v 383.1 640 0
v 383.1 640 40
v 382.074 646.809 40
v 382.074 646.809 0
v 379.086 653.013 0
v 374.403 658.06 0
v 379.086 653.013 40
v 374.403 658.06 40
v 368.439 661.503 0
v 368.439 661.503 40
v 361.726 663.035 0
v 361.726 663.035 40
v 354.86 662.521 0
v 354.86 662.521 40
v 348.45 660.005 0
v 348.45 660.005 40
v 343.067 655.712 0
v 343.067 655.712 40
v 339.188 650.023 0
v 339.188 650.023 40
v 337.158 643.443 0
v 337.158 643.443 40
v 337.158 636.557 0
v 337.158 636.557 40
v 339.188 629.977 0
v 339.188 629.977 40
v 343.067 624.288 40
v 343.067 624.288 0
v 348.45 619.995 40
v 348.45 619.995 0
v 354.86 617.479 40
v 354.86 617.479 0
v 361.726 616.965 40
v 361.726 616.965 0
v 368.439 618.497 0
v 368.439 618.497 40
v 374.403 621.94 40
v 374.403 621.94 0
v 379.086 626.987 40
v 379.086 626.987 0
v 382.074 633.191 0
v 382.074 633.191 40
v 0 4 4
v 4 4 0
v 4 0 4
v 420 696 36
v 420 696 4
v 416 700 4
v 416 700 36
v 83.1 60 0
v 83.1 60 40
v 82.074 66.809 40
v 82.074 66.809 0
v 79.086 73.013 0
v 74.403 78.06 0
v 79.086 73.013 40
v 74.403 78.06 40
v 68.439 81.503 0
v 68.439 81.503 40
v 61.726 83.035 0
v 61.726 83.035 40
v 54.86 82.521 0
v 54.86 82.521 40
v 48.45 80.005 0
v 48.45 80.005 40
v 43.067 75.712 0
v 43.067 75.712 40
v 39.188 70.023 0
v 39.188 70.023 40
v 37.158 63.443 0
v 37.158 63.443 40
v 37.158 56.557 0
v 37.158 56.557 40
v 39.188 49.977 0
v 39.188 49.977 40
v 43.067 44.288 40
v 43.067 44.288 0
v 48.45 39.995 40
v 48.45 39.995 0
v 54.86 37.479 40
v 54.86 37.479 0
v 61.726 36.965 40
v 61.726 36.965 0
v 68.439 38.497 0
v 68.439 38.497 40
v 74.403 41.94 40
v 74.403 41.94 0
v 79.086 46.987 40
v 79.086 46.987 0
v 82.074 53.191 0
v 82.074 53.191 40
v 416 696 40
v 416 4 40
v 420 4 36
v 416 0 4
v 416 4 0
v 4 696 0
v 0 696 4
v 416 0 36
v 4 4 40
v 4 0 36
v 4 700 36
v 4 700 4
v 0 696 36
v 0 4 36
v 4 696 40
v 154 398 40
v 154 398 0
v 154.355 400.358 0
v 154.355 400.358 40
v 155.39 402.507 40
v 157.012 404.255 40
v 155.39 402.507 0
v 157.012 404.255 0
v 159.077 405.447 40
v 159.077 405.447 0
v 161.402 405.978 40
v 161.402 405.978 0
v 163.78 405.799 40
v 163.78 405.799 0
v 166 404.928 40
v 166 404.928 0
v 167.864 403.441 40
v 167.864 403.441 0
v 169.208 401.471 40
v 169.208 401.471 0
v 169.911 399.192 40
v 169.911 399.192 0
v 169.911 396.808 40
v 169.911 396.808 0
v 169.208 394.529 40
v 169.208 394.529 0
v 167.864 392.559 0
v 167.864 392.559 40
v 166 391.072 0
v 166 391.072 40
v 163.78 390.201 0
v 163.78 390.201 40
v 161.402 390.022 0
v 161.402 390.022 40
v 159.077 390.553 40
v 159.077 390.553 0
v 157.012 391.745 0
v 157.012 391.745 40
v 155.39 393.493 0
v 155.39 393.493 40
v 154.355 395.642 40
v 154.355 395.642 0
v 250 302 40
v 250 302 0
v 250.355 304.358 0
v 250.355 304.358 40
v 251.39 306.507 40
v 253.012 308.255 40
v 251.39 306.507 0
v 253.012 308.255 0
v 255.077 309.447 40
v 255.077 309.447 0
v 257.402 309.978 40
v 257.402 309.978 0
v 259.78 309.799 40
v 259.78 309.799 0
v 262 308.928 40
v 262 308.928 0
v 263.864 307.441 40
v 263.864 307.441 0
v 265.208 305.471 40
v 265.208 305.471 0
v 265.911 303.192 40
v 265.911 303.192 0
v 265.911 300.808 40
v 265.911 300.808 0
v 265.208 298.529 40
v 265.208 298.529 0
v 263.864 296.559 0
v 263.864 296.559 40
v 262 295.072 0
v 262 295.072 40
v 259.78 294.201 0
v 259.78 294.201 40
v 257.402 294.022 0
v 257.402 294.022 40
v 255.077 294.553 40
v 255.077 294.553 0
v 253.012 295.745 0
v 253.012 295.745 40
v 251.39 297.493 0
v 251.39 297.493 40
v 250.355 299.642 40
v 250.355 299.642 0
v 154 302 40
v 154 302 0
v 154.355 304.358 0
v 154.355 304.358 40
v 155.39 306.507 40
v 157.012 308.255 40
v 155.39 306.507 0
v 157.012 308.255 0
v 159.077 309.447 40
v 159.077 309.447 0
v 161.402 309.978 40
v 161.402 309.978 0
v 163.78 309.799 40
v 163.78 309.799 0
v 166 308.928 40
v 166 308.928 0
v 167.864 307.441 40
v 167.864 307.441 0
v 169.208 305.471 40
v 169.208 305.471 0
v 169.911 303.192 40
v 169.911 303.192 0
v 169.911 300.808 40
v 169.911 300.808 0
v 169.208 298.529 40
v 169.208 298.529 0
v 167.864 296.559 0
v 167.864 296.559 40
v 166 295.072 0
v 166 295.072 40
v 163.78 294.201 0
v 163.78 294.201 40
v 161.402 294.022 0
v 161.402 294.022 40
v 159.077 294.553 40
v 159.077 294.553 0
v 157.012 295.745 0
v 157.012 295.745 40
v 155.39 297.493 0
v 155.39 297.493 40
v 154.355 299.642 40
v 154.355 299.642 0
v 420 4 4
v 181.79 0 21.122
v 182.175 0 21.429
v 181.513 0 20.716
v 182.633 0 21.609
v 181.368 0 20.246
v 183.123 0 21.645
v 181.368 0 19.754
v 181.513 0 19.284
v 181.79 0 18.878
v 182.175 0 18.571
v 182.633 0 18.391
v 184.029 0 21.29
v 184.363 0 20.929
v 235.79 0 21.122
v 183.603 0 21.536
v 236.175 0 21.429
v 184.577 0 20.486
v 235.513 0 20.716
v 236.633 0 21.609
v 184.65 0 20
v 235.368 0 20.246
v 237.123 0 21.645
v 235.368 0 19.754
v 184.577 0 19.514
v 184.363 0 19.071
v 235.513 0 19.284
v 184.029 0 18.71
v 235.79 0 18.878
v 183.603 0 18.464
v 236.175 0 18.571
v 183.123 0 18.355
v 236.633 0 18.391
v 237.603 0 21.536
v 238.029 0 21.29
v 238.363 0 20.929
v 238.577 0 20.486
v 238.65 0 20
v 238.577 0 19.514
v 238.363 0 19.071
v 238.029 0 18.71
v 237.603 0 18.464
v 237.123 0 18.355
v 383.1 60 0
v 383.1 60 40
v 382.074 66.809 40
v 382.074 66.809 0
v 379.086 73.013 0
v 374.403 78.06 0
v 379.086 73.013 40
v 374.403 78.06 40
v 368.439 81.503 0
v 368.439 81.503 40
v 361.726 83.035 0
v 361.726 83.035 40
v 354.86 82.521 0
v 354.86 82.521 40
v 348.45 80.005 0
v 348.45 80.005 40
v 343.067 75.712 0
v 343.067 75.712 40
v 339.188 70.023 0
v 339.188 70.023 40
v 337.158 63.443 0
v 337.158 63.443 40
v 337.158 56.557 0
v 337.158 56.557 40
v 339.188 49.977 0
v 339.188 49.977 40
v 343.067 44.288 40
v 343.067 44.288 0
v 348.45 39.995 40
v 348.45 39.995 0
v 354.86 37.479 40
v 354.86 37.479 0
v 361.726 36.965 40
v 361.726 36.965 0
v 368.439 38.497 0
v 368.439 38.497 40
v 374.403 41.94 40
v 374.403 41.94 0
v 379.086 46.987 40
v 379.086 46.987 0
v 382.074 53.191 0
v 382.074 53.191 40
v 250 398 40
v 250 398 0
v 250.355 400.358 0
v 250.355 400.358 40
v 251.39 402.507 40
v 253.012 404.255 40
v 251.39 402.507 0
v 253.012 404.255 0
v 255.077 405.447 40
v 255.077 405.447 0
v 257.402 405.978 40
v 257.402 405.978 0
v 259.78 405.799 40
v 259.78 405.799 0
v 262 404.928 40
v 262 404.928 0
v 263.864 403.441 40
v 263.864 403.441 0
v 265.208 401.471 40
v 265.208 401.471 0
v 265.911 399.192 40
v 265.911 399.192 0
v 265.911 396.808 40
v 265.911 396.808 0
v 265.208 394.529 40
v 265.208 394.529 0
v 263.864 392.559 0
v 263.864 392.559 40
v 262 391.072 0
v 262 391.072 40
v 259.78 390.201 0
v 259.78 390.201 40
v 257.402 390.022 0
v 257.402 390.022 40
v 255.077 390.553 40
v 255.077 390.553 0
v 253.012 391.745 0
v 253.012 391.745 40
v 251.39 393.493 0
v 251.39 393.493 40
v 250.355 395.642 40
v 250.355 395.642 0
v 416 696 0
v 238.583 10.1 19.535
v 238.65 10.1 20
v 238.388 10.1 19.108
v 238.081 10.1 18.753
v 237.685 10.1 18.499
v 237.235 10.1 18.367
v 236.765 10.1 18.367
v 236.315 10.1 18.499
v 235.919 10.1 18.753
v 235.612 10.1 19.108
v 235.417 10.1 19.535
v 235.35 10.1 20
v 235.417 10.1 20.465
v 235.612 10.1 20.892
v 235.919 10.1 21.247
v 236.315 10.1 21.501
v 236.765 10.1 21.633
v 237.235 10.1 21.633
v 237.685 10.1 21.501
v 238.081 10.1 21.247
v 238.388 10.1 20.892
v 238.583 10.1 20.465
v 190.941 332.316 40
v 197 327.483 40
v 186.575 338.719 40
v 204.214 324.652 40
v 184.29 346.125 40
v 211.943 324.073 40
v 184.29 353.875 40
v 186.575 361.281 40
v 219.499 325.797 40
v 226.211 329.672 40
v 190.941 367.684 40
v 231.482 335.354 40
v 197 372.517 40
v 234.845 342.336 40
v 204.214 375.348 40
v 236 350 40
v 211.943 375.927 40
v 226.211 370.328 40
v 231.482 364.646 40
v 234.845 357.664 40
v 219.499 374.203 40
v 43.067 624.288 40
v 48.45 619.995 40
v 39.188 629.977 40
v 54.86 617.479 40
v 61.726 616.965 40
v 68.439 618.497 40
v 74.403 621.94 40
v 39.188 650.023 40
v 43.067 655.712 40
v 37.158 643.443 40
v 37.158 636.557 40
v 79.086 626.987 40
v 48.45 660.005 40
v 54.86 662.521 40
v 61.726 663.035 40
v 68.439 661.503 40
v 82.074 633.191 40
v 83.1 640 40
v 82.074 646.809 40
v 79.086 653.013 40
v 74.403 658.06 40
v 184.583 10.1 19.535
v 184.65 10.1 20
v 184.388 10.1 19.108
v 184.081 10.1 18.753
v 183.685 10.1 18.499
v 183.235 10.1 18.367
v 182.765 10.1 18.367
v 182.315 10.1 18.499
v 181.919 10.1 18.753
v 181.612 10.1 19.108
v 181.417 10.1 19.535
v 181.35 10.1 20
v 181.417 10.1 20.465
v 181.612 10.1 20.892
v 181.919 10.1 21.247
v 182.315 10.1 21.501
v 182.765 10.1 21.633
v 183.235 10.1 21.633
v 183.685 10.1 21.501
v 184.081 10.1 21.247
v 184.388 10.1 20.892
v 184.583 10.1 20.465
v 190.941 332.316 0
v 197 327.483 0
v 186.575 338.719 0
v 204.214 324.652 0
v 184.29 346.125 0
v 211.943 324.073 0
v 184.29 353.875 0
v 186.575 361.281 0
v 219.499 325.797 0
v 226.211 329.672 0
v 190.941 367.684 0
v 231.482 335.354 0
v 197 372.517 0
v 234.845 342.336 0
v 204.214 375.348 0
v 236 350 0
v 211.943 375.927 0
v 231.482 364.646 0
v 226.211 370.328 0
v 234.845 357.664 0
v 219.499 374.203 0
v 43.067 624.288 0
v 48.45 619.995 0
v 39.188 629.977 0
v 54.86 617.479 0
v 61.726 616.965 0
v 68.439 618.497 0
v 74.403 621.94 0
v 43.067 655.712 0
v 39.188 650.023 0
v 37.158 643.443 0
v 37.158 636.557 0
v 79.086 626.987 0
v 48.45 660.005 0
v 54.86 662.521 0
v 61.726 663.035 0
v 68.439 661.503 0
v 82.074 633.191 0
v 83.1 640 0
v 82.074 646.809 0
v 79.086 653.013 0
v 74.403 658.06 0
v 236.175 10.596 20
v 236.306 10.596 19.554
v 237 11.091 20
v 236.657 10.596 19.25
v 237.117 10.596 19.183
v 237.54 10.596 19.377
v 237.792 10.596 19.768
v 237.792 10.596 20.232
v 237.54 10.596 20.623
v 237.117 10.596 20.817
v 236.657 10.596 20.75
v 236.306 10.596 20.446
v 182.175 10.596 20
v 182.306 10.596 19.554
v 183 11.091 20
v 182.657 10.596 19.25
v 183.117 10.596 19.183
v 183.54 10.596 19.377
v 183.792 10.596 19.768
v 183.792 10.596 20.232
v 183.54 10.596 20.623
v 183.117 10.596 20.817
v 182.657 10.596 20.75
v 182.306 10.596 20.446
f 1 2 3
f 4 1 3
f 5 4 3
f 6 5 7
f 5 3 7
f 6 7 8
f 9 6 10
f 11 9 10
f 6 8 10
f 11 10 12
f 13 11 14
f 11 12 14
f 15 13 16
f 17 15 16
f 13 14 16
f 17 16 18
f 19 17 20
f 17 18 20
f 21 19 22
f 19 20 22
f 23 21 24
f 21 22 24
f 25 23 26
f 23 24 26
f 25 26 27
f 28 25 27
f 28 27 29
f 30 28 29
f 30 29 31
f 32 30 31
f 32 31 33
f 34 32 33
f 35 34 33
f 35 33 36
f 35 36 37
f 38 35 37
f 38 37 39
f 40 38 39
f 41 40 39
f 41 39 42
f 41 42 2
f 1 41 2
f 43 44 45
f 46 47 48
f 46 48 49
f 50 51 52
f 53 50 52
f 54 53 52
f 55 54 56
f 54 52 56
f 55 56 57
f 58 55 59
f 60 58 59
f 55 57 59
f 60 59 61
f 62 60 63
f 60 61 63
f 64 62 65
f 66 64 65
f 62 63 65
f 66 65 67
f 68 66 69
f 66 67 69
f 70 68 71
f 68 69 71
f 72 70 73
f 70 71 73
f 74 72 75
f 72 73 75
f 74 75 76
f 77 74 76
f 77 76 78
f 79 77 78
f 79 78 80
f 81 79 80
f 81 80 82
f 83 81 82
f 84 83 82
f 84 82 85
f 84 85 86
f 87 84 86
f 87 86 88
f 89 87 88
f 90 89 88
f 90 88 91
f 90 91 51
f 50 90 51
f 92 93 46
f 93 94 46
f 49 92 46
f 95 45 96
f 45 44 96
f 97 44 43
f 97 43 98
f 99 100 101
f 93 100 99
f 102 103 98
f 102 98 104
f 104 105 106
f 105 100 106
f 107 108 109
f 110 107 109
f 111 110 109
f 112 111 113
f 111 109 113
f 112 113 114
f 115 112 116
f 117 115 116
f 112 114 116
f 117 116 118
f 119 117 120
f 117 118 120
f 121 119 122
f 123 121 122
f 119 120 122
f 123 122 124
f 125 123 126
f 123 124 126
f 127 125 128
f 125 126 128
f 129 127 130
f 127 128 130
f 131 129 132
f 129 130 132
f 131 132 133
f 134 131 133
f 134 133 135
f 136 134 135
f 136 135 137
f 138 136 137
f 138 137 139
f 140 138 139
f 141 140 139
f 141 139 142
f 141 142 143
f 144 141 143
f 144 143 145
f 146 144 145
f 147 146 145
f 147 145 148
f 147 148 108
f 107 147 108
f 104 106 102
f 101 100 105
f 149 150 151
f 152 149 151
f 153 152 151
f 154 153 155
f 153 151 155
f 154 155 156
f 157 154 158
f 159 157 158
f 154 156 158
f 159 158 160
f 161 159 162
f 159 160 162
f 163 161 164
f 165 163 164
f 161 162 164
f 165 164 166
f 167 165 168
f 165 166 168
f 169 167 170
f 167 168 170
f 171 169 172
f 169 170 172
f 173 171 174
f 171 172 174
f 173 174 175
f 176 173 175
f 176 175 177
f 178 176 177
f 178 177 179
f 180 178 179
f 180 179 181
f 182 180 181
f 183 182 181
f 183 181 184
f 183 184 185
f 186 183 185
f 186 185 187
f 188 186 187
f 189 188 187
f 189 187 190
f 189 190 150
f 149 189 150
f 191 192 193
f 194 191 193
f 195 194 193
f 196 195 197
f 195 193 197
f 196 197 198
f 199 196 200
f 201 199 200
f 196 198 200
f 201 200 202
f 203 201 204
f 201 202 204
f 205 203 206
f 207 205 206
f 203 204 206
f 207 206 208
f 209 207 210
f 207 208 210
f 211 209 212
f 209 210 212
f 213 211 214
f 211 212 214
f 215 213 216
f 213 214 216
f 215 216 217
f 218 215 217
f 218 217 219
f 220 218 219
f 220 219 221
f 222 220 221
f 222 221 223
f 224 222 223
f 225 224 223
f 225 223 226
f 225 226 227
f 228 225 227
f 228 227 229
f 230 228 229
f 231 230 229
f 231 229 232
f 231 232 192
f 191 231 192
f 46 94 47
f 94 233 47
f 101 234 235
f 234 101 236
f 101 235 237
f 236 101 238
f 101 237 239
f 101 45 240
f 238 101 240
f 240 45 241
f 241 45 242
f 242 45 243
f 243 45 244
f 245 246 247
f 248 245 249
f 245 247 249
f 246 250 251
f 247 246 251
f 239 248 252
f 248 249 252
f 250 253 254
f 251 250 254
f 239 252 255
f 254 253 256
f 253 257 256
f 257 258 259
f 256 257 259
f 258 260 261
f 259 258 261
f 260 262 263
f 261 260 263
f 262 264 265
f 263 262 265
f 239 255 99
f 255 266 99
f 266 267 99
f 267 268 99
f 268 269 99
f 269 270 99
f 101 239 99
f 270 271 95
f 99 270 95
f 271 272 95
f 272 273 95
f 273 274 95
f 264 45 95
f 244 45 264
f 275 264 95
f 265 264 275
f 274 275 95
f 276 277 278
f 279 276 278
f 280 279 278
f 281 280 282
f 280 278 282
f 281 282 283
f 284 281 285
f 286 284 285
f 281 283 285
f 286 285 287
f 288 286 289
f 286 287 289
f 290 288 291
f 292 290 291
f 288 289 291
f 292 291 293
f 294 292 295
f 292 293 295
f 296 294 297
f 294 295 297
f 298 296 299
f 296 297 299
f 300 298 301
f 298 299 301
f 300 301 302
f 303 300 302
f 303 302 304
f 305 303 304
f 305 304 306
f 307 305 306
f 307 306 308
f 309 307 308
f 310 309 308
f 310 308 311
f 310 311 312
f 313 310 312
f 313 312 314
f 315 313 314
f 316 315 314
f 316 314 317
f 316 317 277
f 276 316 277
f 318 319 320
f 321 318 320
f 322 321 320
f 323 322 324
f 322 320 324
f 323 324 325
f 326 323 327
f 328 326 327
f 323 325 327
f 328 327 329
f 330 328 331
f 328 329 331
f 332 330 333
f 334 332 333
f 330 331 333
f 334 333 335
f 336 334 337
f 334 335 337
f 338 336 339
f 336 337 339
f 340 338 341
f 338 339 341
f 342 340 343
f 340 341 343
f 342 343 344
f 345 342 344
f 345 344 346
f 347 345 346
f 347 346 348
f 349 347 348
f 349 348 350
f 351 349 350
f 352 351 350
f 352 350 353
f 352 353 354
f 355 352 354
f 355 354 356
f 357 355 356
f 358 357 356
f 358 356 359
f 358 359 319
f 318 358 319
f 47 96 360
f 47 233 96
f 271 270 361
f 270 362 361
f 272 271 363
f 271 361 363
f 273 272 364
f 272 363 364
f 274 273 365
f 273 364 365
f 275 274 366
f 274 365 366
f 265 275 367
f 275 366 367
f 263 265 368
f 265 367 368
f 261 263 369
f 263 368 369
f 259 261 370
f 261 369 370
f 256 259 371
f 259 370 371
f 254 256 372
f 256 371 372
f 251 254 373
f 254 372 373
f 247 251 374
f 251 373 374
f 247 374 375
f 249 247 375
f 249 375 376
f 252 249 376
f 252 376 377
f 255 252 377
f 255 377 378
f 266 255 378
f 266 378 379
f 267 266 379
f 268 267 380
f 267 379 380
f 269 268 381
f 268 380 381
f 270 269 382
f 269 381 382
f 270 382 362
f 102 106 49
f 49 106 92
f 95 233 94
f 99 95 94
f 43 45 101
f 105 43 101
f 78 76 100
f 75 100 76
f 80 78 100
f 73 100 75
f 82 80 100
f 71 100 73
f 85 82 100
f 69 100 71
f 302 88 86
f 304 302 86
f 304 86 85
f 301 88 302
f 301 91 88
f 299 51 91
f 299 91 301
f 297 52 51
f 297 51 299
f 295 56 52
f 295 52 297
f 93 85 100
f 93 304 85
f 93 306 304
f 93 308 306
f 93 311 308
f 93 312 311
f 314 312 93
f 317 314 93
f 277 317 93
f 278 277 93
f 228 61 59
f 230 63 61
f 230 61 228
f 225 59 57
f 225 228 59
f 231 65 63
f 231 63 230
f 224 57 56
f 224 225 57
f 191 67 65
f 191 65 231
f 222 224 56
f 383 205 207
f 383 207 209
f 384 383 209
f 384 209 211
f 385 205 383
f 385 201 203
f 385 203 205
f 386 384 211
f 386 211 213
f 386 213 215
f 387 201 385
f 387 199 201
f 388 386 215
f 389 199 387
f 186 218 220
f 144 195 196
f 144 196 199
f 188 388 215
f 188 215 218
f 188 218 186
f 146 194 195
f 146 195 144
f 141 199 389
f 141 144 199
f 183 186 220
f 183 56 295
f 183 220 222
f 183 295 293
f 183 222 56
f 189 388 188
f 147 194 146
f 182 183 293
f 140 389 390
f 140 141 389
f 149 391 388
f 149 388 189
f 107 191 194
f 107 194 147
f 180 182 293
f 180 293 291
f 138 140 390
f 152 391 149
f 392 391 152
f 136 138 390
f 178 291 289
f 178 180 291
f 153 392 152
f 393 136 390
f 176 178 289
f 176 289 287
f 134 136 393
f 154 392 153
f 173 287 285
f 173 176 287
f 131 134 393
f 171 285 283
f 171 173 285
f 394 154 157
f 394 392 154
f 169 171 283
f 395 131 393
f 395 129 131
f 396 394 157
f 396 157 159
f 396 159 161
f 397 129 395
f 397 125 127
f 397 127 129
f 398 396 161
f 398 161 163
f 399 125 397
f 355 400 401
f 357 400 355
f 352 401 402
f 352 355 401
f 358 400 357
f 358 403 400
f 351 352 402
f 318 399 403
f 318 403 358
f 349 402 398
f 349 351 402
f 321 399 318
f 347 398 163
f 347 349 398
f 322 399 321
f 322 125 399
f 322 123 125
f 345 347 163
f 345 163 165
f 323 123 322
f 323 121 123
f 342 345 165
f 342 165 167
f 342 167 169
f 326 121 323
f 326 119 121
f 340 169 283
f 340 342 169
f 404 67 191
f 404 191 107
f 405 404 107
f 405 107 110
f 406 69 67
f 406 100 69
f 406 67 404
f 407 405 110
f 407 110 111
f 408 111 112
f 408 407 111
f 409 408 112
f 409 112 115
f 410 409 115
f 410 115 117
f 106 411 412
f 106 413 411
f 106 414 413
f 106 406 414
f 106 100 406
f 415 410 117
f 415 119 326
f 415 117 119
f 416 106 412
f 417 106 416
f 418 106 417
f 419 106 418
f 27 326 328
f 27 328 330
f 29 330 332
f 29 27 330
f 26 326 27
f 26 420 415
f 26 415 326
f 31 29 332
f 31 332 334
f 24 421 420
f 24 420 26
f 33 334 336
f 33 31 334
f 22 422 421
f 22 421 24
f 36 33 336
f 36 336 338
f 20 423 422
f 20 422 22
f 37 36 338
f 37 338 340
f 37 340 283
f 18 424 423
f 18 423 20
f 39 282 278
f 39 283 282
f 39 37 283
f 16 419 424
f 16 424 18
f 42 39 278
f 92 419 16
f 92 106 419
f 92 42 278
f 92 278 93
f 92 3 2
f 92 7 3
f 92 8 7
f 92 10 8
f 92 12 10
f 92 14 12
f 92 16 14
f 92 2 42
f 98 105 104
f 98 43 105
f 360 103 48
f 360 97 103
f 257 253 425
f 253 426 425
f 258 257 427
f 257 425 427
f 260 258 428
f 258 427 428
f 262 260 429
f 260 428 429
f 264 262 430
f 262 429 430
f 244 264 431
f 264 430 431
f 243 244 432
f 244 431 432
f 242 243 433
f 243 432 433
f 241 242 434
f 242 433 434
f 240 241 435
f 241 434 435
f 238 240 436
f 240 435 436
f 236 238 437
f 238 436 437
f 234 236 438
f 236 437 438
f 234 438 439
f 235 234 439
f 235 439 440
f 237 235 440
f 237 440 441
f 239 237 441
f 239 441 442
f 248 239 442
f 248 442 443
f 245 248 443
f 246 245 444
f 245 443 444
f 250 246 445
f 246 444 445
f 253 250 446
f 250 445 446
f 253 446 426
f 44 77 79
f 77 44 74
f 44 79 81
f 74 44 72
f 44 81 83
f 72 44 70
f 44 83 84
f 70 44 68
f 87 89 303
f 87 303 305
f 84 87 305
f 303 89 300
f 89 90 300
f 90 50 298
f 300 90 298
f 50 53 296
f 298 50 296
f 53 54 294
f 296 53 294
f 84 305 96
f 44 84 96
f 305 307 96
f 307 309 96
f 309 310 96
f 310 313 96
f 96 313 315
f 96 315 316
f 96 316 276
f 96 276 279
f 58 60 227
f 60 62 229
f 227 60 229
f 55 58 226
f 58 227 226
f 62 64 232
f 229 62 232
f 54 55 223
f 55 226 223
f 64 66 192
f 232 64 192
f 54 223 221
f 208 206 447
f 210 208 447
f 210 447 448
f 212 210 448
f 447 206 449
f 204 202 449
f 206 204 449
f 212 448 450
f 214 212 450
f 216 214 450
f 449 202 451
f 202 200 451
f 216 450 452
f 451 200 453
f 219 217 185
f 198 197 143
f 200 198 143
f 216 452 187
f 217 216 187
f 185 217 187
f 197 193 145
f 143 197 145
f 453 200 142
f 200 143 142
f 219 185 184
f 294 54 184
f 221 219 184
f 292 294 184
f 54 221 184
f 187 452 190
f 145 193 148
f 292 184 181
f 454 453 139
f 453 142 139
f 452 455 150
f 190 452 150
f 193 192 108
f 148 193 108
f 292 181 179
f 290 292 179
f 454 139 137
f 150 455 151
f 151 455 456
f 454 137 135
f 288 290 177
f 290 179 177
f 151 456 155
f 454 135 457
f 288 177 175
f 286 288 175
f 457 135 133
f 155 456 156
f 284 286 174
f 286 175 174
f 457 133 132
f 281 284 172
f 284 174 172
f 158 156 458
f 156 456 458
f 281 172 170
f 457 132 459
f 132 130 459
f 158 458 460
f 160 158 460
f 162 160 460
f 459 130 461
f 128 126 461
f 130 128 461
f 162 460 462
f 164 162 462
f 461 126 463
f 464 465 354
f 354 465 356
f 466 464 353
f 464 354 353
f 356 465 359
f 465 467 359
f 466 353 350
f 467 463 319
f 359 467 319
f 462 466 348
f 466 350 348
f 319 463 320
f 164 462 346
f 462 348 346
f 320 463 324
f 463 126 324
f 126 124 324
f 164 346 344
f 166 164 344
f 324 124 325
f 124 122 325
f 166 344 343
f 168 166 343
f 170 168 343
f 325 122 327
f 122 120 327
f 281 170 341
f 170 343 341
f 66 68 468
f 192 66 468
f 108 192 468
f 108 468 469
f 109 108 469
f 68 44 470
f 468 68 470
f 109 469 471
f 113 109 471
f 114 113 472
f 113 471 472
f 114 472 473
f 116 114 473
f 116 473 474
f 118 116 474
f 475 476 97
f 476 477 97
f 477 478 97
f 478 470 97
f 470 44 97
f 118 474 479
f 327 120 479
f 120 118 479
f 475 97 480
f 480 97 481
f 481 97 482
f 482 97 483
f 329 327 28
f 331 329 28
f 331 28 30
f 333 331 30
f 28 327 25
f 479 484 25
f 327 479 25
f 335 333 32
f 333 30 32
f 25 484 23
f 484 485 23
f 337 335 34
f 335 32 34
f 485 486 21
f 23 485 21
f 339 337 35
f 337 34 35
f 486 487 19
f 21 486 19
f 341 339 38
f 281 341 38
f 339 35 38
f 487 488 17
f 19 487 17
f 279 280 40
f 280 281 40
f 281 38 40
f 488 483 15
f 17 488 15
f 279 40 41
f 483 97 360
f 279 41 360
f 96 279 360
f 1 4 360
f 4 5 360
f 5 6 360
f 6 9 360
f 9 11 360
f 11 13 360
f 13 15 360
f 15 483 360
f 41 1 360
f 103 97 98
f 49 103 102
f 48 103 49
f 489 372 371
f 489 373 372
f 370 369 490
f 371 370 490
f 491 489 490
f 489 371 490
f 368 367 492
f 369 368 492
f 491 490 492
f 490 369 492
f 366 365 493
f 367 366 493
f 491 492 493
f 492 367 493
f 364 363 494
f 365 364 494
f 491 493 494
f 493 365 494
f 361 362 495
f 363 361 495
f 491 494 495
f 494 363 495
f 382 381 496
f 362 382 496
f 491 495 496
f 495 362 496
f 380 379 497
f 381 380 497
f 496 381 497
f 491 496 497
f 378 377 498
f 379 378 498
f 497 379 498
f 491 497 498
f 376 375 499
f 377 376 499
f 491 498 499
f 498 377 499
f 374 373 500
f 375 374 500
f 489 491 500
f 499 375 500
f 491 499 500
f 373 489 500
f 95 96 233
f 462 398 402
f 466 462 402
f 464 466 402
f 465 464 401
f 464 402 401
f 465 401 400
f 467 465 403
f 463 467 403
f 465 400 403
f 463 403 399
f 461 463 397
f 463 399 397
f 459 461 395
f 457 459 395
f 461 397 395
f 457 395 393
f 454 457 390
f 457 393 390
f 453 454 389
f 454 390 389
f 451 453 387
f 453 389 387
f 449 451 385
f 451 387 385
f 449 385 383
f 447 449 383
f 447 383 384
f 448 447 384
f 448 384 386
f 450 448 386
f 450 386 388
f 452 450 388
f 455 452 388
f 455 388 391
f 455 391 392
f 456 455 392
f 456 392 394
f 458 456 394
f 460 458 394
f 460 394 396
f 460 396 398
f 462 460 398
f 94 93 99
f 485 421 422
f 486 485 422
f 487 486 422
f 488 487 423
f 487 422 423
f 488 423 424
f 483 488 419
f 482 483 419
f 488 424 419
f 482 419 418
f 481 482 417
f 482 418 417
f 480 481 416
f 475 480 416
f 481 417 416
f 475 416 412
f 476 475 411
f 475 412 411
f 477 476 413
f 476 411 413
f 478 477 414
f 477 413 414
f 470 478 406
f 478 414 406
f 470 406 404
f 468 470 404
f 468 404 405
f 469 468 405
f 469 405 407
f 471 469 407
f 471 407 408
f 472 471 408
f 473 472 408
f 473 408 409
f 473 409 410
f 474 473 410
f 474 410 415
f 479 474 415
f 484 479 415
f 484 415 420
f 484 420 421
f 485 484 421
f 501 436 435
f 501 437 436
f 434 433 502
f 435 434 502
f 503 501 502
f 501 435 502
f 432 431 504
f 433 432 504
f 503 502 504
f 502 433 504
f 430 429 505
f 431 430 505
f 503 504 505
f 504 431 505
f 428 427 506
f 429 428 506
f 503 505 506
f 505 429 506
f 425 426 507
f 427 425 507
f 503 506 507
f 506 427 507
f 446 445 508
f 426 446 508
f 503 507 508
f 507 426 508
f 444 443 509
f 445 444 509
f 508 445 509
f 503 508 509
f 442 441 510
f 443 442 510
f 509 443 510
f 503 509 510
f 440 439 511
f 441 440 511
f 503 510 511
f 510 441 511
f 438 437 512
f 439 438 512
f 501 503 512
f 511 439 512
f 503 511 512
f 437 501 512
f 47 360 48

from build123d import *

# Parameters (mm, degrees)
SKETCH_1_W             = 420
SKETCH_1_H             = 700
EXTRUDE_1_DEPTH        = 40
SKETCH_2_R             = 23.1
CUT_EXTRUDE_1_DEPTH    = 818.312669668
SKETCH_3_R             = 26
CUT_EXTRUDE_2_DEPTH    = 818.312669668
M18X2_0_1_D            = 16
CHAMFER_1_SIZE         = 4
HOLE_WIZARD_M4_1_D     = 3.3
HOLE_WIZARD_M4_1_DEPTH = 10.1
HOLE_WIZARD_M4_1_TIP   = 0.991420021


with BuildPart() as part:
    # 草图1 → 凸台-拉伸1 (new body)
    with BuildSketch(Plane.XY):
        with Locations((210, 350)):
            Rectangle(SKETCH_1_W, SKETCH_1_H)
    extrude(amount=EXTRUDE_1_DEPTH)

    # 草图2 → 切除-拉伸1 (cut, through all)
    with BuildSketch(Plane.XY.offset(40)):
        with Locations((60, 60)):
            Circle(SKETCH_2_R)
        with Locations((360, 60)):
            Circle(SKETCH_2_R)
        with Locations((360, 640)):
            Circle(SKETCH_2_R)
        with Locations((60, 640)):
            Circle(SKETCH_2_R)
    extrude(amount=-CUT_EXTRUDE_1_DEPTH, mode=Mode.SUBTRACT)

    # 草图3 → 切除-拉伸2 (cut, through all)
    with BuildSketch(Plane.XY.offset(40)):
        with Locations((210, 350)):
            Circle(SKETCH_3_R)
    extrude(amount=-CUT_EXTRUDE_2_DEPTH, mode=Mode.SUBTRACT)

    # M18x2.0 螺纹孔1 (through all)
    with Locations(Plane.XY.offset(40)):
        with Locations((162, 398), (258, 398), (258, 302), (162, 302)):
            Hole(M18X2_0_1_D / 2)

    # 倒角1
    chamfer_1_edges = [part.edges().sort_by_distance(p)[0] for p in [
        (420, 350, 40),
        (210, 700, 40),
        (0, 350, 40),
        (210, 700, 0),
        (420, 350, 0),
        (210, 0, 0),
        (0, 350, 0),
        (210, 0, 40),
        (0, 700, 20),
        (420, 700, 20),
        (420, 0, 20),
        (0, 0, 20),
    ]]
    chamfer(chamfer_1_edges, length=CHAMFER_1_SIZE)

    # M4 螺纹孔1
    with Locations(Plane(origin=(0, 0, 0), x_dir=(-1, 0, 0), z_dir=(0, -1, 0))):
        with Locations((-237, -20), (-183, -20)):
            Hole(HOLE_WIZARD_M4_1_D / 2, depth=HOLE_WIZARD_M4_1_DEPTH)
            with Locations((0, 0, -(HOLE_WIZARD_M4_1_DEPTH + HOLE_WIZARD_M4_1_TIP / 2))):  # 118° drill point
                Cone(0, HOLE_WIZARD_M4_1_D / 2, HOLE_WIZARD_M4_1_TIP, mode=Mode.SUBTRACT)


solid = part.part
